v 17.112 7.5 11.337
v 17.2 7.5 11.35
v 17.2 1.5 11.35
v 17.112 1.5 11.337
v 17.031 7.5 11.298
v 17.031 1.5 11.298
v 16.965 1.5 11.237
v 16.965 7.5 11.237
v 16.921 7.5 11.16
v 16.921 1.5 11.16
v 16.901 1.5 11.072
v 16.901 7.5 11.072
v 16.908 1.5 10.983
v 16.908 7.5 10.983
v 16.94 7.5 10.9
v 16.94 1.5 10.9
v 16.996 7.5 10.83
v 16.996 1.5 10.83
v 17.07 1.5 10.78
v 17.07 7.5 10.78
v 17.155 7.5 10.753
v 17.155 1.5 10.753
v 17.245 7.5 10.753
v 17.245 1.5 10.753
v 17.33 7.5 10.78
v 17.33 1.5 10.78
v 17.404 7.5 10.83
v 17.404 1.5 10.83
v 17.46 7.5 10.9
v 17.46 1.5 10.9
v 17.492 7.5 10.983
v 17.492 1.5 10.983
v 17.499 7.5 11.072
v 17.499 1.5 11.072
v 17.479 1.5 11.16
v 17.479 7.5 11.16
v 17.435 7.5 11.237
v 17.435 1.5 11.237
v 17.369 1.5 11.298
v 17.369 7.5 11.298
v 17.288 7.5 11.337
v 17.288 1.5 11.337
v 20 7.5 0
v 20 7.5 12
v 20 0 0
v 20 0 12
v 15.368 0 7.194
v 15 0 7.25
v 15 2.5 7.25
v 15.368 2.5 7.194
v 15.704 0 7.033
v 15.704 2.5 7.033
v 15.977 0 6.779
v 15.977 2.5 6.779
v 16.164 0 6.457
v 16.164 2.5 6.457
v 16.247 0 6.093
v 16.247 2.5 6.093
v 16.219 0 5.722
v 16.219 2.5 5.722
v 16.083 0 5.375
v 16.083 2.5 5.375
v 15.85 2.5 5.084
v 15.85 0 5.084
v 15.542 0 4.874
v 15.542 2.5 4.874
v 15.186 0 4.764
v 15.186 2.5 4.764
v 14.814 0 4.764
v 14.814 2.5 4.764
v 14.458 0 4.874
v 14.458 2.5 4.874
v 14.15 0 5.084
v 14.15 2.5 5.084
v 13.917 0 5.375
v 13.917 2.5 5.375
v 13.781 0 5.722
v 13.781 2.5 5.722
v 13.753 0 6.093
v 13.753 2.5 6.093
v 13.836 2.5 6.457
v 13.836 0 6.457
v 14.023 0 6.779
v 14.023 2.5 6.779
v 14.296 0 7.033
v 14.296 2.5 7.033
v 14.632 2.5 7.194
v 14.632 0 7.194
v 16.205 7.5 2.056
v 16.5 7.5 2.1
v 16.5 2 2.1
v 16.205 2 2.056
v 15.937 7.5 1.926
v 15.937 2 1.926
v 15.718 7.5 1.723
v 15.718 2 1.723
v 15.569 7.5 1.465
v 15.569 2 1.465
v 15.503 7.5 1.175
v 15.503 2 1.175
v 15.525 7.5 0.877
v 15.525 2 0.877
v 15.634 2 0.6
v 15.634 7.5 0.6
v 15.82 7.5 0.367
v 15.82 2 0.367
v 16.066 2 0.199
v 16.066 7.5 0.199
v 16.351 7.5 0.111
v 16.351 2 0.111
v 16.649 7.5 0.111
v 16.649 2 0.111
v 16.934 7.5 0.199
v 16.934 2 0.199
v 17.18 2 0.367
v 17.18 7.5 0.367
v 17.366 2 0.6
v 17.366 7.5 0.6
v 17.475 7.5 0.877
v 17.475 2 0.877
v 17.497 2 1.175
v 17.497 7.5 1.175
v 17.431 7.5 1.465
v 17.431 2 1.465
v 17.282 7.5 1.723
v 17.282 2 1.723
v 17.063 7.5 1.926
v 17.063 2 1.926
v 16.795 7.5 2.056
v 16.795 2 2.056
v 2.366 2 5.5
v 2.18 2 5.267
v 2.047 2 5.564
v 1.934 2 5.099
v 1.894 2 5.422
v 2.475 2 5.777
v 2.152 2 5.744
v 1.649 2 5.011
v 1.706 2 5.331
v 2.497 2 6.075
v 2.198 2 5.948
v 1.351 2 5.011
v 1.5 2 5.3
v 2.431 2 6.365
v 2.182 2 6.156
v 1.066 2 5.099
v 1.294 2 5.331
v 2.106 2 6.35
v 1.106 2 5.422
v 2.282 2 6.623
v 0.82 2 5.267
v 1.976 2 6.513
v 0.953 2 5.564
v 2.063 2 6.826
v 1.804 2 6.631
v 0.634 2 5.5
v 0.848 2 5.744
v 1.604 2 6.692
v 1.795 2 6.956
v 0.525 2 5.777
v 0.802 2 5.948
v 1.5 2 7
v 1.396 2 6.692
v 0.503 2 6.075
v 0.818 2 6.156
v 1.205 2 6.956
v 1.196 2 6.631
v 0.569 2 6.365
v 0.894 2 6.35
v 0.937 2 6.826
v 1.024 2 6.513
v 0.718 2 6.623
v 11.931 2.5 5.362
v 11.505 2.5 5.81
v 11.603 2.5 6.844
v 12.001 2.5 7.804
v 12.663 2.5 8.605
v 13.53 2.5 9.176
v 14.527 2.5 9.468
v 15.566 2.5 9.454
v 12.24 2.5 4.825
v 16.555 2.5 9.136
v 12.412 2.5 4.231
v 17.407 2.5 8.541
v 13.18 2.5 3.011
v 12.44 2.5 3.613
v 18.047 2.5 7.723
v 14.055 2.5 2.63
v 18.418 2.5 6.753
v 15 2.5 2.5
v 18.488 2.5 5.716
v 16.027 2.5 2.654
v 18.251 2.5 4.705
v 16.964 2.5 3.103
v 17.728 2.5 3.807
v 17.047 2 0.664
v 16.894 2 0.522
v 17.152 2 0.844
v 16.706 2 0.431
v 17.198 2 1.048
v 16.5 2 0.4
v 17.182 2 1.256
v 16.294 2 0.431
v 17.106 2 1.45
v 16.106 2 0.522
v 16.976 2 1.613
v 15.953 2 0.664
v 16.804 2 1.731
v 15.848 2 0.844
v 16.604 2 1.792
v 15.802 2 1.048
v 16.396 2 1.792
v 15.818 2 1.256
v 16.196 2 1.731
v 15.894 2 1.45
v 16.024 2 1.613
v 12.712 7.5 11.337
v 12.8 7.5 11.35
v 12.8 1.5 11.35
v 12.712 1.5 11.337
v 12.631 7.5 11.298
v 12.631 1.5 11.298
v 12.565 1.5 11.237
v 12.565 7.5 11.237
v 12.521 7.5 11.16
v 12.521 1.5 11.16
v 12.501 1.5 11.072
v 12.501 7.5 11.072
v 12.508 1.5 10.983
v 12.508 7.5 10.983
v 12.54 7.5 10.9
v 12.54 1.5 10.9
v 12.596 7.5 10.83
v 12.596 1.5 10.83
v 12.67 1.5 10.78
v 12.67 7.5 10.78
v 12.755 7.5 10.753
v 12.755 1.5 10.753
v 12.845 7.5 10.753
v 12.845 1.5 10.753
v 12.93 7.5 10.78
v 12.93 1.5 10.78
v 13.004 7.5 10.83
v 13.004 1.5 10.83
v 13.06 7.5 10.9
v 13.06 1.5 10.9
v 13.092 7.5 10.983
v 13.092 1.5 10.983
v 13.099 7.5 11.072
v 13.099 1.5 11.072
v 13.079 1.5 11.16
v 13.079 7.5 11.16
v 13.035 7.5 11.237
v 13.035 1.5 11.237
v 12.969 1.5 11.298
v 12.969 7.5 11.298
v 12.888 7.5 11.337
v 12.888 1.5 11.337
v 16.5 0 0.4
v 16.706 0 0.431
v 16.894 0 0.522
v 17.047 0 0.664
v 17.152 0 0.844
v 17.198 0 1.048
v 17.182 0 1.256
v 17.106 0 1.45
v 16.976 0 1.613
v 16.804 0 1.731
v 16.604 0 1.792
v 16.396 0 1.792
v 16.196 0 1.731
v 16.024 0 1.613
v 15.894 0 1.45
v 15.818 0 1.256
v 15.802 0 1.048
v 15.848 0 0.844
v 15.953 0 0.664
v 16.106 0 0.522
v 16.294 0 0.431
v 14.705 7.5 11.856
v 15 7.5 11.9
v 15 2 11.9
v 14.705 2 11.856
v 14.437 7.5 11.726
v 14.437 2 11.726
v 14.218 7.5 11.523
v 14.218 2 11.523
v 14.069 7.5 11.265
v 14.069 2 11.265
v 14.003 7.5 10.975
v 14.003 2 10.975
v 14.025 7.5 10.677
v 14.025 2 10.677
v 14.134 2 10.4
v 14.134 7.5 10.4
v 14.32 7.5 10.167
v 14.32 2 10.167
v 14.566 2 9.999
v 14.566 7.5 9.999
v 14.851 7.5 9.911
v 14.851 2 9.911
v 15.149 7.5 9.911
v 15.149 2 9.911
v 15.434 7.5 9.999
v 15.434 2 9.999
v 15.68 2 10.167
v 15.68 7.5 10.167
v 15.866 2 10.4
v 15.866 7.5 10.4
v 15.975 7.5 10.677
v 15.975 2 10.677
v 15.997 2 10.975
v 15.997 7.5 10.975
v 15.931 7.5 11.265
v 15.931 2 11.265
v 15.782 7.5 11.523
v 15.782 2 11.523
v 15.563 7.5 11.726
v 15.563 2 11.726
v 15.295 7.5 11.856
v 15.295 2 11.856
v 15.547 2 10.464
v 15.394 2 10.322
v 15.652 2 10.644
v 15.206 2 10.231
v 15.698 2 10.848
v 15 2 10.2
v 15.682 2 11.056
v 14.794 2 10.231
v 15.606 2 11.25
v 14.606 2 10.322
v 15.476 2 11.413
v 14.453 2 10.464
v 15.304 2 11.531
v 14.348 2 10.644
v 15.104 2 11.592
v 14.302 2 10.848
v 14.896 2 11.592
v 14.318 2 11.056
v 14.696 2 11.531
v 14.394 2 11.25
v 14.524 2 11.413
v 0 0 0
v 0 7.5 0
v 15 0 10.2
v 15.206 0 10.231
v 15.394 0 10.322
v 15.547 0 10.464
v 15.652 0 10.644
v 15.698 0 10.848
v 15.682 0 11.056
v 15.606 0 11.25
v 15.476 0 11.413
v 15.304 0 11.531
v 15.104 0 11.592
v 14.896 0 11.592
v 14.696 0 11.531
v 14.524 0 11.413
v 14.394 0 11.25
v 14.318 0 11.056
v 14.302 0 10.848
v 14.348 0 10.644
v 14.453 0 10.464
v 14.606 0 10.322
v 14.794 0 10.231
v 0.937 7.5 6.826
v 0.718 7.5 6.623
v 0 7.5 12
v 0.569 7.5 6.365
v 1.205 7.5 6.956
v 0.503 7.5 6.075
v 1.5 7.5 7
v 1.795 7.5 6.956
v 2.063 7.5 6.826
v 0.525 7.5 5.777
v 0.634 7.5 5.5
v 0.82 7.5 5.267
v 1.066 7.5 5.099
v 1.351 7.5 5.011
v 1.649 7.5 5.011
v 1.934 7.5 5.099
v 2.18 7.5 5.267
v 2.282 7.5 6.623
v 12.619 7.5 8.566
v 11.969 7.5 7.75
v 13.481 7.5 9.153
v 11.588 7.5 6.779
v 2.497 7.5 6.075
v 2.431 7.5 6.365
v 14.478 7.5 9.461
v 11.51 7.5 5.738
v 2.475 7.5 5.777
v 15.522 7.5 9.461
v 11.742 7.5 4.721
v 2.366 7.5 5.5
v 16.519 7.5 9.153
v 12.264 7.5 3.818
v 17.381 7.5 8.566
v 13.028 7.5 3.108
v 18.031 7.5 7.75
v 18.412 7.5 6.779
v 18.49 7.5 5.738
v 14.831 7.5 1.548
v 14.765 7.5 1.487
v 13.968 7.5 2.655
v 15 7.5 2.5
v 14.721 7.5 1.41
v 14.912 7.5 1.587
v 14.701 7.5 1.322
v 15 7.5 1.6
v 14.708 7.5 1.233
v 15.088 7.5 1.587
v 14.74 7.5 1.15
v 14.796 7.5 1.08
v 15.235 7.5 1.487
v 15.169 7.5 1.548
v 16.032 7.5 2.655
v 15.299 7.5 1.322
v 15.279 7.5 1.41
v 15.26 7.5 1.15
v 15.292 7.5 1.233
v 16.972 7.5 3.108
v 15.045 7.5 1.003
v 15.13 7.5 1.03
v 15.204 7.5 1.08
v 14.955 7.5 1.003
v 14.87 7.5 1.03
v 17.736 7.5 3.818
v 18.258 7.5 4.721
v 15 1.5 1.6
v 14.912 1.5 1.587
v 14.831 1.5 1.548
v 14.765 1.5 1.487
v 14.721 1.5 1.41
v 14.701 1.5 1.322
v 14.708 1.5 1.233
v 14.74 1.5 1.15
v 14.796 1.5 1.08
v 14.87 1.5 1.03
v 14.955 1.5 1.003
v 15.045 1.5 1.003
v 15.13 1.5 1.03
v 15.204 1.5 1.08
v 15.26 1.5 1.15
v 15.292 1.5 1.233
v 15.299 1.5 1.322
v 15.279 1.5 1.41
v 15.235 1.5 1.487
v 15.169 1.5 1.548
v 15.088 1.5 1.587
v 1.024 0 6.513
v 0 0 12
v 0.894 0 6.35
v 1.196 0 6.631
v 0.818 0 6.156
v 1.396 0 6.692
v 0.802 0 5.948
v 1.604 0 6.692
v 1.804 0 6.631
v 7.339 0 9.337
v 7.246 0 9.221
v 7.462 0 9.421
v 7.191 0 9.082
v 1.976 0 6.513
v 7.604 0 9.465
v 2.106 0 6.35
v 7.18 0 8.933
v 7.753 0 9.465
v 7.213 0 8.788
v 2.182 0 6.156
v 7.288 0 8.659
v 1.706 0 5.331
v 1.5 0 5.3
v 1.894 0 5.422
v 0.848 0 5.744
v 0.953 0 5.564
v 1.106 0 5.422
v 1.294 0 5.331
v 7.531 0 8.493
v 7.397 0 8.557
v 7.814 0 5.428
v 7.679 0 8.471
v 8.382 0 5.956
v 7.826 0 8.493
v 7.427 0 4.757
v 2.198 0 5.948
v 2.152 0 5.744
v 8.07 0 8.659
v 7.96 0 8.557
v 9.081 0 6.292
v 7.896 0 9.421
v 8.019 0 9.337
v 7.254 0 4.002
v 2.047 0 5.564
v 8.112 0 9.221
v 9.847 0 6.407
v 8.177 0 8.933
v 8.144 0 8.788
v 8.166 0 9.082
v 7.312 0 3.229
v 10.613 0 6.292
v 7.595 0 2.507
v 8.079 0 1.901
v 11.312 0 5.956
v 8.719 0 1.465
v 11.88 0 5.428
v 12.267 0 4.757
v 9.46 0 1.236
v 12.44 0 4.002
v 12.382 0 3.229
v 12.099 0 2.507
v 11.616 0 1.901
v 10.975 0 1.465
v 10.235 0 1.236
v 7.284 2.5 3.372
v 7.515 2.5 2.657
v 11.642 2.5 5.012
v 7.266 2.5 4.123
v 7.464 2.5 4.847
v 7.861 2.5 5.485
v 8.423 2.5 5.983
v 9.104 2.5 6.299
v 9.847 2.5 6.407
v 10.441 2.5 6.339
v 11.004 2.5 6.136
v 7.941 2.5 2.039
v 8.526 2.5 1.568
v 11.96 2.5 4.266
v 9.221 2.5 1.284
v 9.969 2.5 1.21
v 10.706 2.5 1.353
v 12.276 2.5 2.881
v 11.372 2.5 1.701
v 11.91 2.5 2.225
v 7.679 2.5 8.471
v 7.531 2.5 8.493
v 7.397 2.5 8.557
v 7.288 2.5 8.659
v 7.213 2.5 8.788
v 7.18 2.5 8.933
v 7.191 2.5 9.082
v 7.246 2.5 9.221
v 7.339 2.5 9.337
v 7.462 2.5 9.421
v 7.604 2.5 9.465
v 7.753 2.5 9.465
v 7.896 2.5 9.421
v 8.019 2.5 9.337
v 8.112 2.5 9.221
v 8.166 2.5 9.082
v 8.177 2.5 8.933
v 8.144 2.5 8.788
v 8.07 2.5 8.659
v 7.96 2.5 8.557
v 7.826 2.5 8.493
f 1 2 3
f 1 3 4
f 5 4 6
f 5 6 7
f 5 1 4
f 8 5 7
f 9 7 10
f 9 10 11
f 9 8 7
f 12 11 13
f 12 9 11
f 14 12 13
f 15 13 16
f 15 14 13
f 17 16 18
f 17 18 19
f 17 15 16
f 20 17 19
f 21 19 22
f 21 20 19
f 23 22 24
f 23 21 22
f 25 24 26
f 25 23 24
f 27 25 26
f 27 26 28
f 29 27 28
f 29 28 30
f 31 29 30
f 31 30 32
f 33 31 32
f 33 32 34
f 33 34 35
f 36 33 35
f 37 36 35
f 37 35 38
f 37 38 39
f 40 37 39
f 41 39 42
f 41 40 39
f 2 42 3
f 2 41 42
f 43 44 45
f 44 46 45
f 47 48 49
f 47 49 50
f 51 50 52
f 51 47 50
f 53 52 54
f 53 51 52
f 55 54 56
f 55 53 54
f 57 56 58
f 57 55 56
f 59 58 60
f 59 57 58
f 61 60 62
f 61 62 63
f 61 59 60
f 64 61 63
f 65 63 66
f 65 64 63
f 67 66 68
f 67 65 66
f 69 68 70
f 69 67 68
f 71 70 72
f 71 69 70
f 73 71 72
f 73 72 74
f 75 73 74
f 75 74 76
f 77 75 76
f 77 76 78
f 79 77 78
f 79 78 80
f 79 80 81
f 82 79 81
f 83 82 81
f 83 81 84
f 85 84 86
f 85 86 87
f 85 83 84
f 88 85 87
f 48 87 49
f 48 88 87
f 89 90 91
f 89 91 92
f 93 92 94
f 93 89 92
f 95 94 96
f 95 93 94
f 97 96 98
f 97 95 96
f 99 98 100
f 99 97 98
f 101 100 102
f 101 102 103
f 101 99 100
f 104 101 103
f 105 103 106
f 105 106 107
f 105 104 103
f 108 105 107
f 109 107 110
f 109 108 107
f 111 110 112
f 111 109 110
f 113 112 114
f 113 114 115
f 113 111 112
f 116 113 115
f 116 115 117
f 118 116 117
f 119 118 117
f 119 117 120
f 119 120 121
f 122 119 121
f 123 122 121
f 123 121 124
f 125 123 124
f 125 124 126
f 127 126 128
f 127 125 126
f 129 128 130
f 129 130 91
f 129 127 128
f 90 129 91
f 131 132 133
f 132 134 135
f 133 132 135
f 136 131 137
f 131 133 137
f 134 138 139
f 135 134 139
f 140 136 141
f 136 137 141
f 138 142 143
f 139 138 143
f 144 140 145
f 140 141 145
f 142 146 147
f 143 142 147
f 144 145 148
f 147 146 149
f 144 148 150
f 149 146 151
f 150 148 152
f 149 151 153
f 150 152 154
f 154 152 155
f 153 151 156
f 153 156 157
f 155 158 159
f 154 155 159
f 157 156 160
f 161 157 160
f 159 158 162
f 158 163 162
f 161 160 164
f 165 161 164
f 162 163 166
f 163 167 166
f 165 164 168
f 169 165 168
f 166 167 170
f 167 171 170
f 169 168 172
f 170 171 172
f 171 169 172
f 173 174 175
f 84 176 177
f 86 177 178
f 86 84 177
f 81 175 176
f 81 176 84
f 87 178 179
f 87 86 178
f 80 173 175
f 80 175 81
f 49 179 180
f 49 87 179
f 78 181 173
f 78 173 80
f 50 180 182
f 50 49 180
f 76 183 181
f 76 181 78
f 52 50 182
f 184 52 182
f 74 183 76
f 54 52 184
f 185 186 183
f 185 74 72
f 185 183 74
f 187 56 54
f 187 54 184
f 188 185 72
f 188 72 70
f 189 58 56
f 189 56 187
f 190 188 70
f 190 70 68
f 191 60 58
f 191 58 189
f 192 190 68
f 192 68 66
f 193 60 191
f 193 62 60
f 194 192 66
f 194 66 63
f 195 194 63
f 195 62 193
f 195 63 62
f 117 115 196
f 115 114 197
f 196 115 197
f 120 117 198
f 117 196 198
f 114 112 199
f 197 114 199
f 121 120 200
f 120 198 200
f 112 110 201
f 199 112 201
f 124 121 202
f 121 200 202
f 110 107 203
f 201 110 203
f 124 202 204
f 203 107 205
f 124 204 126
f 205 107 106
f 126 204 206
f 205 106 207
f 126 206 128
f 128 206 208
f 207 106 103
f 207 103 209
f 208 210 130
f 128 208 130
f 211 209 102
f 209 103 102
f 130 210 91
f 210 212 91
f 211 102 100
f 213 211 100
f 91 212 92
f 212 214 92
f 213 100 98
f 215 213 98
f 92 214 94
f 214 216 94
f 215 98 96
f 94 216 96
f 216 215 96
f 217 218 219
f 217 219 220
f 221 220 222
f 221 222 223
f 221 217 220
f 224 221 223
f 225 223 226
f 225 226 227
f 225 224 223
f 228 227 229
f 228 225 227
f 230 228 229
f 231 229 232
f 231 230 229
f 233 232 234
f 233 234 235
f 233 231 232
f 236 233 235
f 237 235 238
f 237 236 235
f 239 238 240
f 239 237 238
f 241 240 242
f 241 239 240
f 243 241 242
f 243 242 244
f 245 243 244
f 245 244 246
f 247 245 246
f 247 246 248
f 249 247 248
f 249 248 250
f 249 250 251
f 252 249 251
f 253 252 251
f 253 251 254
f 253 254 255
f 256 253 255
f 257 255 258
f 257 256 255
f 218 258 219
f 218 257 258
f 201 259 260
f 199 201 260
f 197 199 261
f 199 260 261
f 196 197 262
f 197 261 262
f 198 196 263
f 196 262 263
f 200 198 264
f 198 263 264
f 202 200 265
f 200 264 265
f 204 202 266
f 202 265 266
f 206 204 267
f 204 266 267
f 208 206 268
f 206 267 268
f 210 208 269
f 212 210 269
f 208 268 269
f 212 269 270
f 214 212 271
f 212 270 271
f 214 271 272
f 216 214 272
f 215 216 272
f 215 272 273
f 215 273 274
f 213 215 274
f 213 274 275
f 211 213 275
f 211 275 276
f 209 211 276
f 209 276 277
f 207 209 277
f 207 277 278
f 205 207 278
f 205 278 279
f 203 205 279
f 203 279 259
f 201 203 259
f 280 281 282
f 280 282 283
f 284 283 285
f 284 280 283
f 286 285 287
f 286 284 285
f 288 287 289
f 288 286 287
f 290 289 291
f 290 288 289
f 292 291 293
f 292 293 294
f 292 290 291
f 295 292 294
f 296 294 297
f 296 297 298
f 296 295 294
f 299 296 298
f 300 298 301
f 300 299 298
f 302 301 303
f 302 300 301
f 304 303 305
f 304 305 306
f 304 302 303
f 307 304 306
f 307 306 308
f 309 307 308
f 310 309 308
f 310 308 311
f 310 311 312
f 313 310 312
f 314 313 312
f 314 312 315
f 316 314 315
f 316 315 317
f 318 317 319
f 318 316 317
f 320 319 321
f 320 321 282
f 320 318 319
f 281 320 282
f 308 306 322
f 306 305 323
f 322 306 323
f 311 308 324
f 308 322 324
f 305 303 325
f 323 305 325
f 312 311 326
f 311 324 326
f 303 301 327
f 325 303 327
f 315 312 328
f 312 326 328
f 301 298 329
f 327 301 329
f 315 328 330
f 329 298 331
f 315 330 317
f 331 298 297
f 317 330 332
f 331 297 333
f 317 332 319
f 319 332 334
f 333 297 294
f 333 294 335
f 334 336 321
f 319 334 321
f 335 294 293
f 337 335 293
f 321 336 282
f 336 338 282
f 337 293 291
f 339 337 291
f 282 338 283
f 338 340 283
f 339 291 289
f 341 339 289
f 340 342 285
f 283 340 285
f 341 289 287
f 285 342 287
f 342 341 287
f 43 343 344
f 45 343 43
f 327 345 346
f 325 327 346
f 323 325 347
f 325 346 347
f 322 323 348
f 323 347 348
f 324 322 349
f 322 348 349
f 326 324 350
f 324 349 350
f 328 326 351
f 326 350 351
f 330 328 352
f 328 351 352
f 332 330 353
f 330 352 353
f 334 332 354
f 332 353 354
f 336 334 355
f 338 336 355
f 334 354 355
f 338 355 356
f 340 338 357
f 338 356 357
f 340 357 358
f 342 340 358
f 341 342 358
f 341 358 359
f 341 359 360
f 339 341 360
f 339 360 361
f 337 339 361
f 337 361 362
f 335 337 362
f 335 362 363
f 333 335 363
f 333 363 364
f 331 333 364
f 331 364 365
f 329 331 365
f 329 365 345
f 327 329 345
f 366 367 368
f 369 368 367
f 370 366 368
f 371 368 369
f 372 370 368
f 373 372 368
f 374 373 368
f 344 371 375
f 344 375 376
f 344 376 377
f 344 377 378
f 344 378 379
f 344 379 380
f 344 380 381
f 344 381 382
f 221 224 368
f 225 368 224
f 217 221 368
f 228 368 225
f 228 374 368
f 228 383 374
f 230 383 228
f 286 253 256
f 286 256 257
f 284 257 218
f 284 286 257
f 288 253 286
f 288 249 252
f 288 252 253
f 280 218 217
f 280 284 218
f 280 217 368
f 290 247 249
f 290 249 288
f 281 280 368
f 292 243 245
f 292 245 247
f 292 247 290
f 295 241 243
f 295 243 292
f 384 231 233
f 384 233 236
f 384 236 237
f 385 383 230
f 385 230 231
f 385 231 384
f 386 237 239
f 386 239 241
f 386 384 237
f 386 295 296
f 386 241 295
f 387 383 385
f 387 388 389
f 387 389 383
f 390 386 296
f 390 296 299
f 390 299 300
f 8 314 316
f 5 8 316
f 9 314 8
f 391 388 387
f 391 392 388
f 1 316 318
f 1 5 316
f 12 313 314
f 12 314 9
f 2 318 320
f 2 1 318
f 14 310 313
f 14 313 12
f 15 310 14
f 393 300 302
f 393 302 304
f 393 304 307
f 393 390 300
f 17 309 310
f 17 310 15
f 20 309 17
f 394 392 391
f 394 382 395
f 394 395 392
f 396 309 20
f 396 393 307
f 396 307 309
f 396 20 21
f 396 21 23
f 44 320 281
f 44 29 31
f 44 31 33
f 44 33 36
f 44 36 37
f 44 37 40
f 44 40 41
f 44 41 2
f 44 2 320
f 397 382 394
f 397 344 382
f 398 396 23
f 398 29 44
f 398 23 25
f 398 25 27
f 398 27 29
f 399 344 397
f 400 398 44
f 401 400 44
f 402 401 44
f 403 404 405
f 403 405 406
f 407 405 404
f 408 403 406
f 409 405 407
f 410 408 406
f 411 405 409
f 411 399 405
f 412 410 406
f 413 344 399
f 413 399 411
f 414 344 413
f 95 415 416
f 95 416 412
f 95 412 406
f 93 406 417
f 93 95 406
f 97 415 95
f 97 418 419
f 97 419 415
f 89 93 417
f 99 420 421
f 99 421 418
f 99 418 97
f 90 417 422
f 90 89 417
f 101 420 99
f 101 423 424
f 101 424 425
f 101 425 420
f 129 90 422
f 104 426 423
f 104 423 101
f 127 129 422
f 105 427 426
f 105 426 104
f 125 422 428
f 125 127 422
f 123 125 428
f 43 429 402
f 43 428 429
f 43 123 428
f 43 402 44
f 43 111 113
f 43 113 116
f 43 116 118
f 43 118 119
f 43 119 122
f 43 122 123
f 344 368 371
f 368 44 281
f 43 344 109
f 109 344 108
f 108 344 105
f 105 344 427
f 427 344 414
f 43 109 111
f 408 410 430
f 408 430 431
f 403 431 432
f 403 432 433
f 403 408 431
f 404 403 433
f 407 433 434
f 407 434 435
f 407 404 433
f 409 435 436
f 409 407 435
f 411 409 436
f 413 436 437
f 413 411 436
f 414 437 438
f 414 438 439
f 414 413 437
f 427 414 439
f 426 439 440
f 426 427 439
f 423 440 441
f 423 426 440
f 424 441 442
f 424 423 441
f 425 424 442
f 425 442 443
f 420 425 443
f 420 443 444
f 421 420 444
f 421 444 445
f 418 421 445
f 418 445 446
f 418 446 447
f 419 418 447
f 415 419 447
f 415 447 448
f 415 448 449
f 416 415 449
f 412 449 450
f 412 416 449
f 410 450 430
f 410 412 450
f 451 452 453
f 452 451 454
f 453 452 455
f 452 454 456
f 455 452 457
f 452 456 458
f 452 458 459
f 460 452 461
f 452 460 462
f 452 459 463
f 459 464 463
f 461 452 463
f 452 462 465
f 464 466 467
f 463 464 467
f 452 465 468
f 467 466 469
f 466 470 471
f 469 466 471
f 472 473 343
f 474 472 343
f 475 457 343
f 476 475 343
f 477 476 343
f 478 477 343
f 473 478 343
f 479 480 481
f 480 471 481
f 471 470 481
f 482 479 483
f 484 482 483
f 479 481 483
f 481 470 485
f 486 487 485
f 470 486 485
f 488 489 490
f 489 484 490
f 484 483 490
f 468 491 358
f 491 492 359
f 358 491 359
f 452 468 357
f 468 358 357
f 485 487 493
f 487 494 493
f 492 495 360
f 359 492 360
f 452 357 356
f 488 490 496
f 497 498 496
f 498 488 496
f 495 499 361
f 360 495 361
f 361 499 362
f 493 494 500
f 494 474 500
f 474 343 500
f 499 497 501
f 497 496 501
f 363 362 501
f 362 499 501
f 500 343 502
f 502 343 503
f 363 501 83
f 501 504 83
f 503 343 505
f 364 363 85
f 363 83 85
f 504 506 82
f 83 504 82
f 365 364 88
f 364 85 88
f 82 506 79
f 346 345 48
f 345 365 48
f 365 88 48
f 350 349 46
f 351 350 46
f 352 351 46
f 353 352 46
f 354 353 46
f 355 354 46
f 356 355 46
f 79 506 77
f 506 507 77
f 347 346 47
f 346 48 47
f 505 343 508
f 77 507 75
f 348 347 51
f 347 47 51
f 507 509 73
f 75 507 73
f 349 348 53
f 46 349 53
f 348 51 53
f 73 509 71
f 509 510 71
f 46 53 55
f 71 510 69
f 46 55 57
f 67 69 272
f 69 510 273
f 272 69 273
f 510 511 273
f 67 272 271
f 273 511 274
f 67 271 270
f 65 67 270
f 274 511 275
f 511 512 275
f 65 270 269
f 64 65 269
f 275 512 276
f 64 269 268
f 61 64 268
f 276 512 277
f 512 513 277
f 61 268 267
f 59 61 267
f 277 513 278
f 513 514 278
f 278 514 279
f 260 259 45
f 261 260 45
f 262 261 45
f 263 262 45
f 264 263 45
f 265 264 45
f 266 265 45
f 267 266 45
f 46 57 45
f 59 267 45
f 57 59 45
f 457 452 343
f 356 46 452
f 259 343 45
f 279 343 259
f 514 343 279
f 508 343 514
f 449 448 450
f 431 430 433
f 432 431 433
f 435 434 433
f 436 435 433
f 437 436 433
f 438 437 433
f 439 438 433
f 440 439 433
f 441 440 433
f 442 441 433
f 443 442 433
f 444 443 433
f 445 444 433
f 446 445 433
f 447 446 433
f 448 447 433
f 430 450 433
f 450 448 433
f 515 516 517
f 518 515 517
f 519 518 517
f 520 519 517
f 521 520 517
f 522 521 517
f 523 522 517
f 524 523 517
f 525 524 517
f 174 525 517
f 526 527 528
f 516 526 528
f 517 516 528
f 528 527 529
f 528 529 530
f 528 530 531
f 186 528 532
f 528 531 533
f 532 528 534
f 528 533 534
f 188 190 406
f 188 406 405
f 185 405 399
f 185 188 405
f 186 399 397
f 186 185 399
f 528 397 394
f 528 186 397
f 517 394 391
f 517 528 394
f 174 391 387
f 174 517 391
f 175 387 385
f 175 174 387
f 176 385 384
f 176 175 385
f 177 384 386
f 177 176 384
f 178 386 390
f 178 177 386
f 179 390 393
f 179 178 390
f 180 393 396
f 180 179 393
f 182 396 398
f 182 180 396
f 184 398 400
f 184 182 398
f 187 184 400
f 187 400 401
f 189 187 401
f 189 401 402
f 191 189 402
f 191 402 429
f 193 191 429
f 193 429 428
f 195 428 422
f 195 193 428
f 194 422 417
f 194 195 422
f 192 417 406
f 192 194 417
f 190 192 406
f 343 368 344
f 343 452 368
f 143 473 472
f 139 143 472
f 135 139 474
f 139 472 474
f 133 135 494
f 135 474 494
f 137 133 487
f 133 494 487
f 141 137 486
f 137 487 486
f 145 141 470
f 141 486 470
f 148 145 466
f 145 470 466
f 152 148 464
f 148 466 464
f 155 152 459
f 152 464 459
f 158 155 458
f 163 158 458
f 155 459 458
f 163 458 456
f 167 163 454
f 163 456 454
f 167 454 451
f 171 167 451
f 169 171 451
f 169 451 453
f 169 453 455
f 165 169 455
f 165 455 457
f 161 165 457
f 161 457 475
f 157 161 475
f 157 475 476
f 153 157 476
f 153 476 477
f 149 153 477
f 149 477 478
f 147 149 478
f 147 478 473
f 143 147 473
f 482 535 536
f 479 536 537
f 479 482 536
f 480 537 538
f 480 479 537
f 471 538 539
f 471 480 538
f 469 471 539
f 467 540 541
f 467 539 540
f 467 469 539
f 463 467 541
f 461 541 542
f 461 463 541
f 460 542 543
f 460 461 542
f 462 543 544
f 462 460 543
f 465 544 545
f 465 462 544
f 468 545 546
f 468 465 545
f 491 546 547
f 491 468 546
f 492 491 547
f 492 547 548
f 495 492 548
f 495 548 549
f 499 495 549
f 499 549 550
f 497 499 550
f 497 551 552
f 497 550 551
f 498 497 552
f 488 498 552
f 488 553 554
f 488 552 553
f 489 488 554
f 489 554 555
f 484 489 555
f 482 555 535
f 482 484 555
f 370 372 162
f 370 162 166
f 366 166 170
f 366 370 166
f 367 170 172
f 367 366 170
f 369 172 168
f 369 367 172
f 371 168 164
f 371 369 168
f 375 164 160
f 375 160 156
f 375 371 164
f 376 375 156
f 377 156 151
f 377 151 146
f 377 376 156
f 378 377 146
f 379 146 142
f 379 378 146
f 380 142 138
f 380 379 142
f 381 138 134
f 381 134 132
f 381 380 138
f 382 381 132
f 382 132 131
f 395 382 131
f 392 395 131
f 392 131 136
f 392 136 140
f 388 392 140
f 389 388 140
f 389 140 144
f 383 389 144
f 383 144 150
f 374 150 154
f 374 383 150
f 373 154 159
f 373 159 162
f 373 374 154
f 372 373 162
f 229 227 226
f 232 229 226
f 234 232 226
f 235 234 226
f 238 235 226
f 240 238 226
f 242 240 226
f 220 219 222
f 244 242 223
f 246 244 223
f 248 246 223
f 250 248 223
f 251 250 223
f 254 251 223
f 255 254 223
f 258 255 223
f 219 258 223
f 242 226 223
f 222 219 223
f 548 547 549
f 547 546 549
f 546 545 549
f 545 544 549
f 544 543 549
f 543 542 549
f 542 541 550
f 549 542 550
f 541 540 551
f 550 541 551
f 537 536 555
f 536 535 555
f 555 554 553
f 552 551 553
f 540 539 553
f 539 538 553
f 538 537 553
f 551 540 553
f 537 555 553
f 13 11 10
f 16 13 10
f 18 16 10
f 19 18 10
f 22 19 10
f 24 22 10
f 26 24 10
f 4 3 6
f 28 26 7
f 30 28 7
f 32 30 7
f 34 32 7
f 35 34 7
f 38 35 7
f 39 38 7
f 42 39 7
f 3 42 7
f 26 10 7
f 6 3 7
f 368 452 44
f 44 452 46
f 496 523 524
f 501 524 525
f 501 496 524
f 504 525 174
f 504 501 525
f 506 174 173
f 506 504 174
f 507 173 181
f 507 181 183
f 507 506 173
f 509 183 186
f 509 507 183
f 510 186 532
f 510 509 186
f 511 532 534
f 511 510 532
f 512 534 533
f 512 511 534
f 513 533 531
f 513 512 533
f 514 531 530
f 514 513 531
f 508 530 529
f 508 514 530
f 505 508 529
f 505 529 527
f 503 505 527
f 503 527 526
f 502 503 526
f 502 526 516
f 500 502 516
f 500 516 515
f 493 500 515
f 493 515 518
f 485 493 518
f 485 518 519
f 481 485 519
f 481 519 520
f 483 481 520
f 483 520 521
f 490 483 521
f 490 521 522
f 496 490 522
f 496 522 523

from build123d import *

# Parameters (mm, degrees)
SKETCH_1_W          = 20
SKETCH_1_H          = 12
EXTRUDE_1_DEPTH     = 2.5
SKETCH_1_8_R        = 0.5
CUT_EXTRUDE_1_DEPTH = 3
SKETCH_1_9_R        = 2.6
SKETCH_1_9_R_2      = 1.25
CUT_EXTRUDE_3_DEPTH = 2.5
EXTRUDE_START       = 2.5
SKETCH_1_10_W       = 20
SKETCH_1_10_H       = 12
SKETCH_1_10_R       = 3.5
EXTRUDE_2_DEPTH     = 5
SKETCH_2_R          = 0.7
CUT_EXTRUDE_4_DEPTH = 25.5
CUT_EXTRUDE_START   = -7.5
SKETCH_2_3_R        = 1
CUT_EXTRUDE_5_DEPTH = 5.5
SKETCH_2_6_R        = 0.3
CUT_EXTRUDE_6_DEPTH = 6


with BuildPart() as part:
    # 草图1 → 凸台-拉伸1 (new body)
    with BuildSketch(Plane(origin=(0, 0, 0), x_dir=(1, 0, 0), z_dir=(0, 1, 0))):
        with Locations((10, -6)):
            Rectangle(SKETCH_1_W, SKETCH_1_H)
    extrude(amount=EXTRUDE_1_DEPTH)

    # 草图1<8> → 切除-拉伸1 (cut)
    with BuildSketch(Plane(origin=(0, 0, 0), x_dir=(1, 0, 0), z_dir=(0, 1, 0))):
        with Locations(Location((7.678736094, -8.970584613, 0), (0, 0, 90))):
            Circle(SKETCH_1_8_R)
    extrude(amount=CUT_EXTRUDE_1_DEPTH, mode=Mode.SUBTRACT)

    # 草图1<9> → 切除-拉伸3 (cut)
    with BuildSketch(Plane(origin=(0, 0, 0), x_dir=(1, 0, 0), z_dir=(0, 1, 0))):
        with Locations(Location((9.847079862, -3.807418404, 0), (0, 0, 270))):
            Circle(SKETCH_1_9_R)
        with Locations(Location((15, -6, 0), (0, 0, 270))):
            Circle(SKETCH_1_9_R_2)
    extrude(amount=CUT_EXTRUDE_3_DEPTH, mode=Mode.SUBTRACT)

    # 草图1<10> → 凸台-拉伸2 (add)
    with BuildSketch(Plane(origin=(0, 0, 0), x_dir=(1, 0, 0), z_dir=(0, 1, 0)).offset(EXTRUDE_START)):
        with Locations((10, -6)):
            Rectangle(SKETCH_1_10_W, SKETCH_1_10_H)
        with Locations(Location((15, -6, 0), (0, 0, 90))):
            Circle(SKETCH_1_10_R, mode=Mode.SUBTRACT)
    extrude(amount=EXTRUDE_2_DEPTH)

    # 草图2 → 切除-拉伸4 (cut, through all)
    with BuildSketch(Plane.XZ):
        with Locations(Location((15, 10.9, 0), (0, 0, 270))):
            Circle(SKETCH_2_R)
        with Locations(Location((1.5, 6, 0), (0, 0, 270))):
            Circle(SKETCH_2_R)
        with Locations(Location((16.5, 1.1, 0), (0, 0, 270))):
            Circle(SKETCH_2_R)
    extrude(amount=-CUT_EXTRUDE_4_DEPTH, mode=Mode.SUBTRACT)

    # 草图2<3> → 切除-拉伸5 (cut)
    with BuildSketch(Plane.XZ.offset(CUT_EXTRUDE_START)):
        with Locations(Location((16.5, 1.1, 0), (0, 0, 90))):
            Circle(SKETCH_2_3_R)
        with Locations(Location((15, 10.9, 0), (0, 0, 90))):
            Circle(SKETCH_2_3_R)
        with Locations(Location((1.5, 6, 0), (0, 0, 90))):
            Circle(SKETCH_2_3_R)
    extrude(amount=CUT_EXTRUDE_5_DEPTH, mode=Mode.SUBTRACT)

    # 草图2<6> → 切除-拉伸6 (cut)
    with BuildSketch(Plane.XZ.offset(CUT_EXTRUDE_START)):
        with Locations(Location((12.8, 11.05, 0), (0, 0, 90))):
            Circle(SKETCH_2_6_R)
        with Locations(Location((17.2, 11.05, 0), (0, 0, 90))):
            Circle(SKETCH_2_6_R)
        with Locations(Location((15, 1.3, 0), (0, 0, 90))):
            Circle(SKETCH_2_6_R)
    extrude(amount=CUT_EXTRUDE_6_DEPTH, mode=Mode.SUBTRACT)


solid = part.part
